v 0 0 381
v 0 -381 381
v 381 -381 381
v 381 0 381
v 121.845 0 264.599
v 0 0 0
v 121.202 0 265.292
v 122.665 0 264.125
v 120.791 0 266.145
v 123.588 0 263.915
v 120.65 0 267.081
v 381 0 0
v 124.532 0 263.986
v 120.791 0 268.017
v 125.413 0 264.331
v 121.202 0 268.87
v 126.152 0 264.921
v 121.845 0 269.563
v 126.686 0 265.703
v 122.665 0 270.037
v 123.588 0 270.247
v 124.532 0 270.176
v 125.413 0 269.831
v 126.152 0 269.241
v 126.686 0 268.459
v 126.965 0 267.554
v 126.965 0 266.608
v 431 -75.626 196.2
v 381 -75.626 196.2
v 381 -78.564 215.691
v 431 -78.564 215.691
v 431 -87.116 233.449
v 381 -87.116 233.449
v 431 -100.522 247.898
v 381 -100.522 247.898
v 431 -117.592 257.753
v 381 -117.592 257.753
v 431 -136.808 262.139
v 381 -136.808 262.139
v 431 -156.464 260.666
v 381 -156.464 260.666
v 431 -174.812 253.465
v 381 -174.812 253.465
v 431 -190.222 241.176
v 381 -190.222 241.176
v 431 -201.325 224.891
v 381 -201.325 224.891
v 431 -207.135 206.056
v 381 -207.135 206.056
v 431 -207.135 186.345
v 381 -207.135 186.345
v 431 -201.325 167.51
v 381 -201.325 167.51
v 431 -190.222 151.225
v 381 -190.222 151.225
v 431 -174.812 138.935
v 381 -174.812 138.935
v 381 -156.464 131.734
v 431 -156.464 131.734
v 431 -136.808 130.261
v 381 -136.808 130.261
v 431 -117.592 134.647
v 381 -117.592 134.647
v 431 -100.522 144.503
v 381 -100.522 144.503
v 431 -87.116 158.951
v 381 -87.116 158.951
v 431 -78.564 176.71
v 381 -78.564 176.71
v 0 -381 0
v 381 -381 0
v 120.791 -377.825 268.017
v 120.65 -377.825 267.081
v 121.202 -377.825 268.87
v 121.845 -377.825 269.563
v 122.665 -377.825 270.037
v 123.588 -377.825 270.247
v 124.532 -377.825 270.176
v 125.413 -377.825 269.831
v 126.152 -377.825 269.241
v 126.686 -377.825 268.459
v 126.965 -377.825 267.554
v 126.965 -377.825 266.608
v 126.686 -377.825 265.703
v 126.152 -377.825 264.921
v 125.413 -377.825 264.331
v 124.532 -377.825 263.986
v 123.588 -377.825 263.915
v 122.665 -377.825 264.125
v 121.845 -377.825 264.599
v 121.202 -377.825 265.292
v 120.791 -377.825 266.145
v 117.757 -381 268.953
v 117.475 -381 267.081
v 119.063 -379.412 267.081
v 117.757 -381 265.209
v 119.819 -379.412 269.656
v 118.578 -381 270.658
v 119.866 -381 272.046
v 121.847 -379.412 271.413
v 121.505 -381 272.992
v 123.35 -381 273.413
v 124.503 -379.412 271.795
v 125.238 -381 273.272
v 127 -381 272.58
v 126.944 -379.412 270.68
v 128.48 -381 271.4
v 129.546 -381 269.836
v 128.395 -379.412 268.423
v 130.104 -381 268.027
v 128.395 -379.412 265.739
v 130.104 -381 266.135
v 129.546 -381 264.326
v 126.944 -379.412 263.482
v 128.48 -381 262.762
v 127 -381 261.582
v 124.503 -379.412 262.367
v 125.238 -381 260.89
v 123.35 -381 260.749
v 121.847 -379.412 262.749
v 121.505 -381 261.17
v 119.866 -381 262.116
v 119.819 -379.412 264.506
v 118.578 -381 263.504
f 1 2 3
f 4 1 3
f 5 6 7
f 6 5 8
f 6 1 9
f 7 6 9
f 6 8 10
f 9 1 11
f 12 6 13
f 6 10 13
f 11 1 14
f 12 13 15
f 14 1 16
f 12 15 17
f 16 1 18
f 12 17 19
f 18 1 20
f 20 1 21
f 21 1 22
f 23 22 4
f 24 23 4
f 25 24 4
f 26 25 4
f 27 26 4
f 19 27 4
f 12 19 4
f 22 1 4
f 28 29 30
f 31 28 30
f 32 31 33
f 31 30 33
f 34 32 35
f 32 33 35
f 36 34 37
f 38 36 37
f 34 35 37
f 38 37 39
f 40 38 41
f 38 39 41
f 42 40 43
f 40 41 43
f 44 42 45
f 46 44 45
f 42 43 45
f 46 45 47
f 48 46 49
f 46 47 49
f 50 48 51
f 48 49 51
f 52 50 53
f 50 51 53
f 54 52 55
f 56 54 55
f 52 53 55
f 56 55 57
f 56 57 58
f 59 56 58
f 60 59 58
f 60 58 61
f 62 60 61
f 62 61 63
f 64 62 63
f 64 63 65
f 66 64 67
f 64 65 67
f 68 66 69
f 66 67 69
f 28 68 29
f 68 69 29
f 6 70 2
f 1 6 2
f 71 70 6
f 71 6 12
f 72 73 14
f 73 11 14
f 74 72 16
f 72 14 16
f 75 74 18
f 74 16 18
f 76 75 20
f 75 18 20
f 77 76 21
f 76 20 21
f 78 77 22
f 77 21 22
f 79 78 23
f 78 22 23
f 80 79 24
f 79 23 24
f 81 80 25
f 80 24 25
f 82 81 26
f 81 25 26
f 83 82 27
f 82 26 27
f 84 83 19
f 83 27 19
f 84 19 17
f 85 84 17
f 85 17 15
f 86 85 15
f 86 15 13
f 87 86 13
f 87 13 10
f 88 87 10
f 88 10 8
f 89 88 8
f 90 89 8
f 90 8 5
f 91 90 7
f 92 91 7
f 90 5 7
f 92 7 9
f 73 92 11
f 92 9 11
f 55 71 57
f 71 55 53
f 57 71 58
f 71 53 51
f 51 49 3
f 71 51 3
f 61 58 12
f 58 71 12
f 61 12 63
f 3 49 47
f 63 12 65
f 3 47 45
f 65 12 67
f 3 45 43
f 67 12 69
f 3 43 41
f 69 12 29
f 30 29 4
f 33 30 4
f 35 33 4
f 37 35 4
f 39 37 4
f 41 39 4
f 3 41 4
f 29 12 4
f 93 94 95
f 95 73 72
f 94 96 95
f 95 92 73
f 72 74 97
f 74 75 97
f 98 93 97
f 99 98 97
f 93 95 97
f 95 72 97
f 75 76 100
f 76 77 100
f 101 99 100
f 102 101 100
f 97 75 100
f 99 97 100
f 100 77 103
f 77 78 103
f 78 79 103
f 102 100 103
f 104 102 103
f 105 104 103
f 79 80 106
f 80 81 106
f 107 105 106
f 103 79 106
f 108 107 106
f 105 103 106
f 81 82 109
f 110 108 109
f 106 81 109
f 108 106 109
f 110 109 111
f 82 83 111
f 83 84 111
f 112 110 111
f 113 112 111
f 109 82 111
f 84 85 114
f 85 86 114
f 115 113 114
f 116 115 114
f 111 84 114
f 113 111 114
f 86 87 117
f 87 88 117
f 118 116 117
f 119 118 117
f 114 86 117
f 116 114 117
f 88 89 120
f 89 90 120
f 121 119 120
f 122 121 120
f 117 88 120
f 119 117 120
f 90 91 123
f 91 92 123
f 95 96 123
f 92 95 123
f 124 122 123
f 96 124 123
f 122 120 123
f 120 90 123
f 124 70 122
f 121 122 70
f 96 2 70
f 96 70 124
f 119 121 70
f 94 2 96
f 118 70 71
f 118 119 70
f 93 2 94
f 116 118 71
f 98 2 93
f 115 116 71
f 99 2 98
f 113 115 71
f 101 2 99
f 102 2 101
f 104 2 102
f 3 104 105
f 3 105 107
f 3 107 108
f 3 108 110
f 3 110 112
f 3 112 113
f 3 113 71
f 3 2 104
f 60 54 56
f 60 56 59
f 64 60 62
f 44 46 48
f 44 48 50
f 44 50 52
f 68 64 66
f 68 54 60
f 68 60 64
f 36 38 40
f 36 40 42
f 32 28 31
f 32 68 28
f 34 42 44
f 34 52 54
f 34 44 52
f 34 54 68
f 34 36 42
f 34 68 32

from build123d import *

# Parameters (mm, degrees)
F0_W           = 381
F0_H           = 381
F1_DEPTH       = 381
F3_D           = 6.35
F3_CSINK_D     = 12.7
F3_CSINK_ANGLE = 90
F4_R           = 66.123945
F5_DEPTH       = 50


with BuildPart() as f1:
    # F0 (on Front) → F1 (new body)
    with BuildSketch(Plane.XZ):
        with Locations((190.5, 190.5)):
            Rectangle(F0_W, F0_H)
    extrude(amount=F1_DEPTH)

    # F3 (through all)
    with Locations(Plane.XZ.offset(381)):
        with Locations((123.825006, 267.081022)):
            CounterSinkHole(F3_D / 2, F3_CSINK_D / 2, counter_sink_angle=F3_CSINK_ANGLE)

    # F4 (on face) → F5 (join)
    with BuildSketch(Plane.YZ.offset(381)):
        with Locations((-141.749784, 196.200415)):
            Circle(F4_R)
    extrude(amount=F5_DEPTH)


solid = f1.part
